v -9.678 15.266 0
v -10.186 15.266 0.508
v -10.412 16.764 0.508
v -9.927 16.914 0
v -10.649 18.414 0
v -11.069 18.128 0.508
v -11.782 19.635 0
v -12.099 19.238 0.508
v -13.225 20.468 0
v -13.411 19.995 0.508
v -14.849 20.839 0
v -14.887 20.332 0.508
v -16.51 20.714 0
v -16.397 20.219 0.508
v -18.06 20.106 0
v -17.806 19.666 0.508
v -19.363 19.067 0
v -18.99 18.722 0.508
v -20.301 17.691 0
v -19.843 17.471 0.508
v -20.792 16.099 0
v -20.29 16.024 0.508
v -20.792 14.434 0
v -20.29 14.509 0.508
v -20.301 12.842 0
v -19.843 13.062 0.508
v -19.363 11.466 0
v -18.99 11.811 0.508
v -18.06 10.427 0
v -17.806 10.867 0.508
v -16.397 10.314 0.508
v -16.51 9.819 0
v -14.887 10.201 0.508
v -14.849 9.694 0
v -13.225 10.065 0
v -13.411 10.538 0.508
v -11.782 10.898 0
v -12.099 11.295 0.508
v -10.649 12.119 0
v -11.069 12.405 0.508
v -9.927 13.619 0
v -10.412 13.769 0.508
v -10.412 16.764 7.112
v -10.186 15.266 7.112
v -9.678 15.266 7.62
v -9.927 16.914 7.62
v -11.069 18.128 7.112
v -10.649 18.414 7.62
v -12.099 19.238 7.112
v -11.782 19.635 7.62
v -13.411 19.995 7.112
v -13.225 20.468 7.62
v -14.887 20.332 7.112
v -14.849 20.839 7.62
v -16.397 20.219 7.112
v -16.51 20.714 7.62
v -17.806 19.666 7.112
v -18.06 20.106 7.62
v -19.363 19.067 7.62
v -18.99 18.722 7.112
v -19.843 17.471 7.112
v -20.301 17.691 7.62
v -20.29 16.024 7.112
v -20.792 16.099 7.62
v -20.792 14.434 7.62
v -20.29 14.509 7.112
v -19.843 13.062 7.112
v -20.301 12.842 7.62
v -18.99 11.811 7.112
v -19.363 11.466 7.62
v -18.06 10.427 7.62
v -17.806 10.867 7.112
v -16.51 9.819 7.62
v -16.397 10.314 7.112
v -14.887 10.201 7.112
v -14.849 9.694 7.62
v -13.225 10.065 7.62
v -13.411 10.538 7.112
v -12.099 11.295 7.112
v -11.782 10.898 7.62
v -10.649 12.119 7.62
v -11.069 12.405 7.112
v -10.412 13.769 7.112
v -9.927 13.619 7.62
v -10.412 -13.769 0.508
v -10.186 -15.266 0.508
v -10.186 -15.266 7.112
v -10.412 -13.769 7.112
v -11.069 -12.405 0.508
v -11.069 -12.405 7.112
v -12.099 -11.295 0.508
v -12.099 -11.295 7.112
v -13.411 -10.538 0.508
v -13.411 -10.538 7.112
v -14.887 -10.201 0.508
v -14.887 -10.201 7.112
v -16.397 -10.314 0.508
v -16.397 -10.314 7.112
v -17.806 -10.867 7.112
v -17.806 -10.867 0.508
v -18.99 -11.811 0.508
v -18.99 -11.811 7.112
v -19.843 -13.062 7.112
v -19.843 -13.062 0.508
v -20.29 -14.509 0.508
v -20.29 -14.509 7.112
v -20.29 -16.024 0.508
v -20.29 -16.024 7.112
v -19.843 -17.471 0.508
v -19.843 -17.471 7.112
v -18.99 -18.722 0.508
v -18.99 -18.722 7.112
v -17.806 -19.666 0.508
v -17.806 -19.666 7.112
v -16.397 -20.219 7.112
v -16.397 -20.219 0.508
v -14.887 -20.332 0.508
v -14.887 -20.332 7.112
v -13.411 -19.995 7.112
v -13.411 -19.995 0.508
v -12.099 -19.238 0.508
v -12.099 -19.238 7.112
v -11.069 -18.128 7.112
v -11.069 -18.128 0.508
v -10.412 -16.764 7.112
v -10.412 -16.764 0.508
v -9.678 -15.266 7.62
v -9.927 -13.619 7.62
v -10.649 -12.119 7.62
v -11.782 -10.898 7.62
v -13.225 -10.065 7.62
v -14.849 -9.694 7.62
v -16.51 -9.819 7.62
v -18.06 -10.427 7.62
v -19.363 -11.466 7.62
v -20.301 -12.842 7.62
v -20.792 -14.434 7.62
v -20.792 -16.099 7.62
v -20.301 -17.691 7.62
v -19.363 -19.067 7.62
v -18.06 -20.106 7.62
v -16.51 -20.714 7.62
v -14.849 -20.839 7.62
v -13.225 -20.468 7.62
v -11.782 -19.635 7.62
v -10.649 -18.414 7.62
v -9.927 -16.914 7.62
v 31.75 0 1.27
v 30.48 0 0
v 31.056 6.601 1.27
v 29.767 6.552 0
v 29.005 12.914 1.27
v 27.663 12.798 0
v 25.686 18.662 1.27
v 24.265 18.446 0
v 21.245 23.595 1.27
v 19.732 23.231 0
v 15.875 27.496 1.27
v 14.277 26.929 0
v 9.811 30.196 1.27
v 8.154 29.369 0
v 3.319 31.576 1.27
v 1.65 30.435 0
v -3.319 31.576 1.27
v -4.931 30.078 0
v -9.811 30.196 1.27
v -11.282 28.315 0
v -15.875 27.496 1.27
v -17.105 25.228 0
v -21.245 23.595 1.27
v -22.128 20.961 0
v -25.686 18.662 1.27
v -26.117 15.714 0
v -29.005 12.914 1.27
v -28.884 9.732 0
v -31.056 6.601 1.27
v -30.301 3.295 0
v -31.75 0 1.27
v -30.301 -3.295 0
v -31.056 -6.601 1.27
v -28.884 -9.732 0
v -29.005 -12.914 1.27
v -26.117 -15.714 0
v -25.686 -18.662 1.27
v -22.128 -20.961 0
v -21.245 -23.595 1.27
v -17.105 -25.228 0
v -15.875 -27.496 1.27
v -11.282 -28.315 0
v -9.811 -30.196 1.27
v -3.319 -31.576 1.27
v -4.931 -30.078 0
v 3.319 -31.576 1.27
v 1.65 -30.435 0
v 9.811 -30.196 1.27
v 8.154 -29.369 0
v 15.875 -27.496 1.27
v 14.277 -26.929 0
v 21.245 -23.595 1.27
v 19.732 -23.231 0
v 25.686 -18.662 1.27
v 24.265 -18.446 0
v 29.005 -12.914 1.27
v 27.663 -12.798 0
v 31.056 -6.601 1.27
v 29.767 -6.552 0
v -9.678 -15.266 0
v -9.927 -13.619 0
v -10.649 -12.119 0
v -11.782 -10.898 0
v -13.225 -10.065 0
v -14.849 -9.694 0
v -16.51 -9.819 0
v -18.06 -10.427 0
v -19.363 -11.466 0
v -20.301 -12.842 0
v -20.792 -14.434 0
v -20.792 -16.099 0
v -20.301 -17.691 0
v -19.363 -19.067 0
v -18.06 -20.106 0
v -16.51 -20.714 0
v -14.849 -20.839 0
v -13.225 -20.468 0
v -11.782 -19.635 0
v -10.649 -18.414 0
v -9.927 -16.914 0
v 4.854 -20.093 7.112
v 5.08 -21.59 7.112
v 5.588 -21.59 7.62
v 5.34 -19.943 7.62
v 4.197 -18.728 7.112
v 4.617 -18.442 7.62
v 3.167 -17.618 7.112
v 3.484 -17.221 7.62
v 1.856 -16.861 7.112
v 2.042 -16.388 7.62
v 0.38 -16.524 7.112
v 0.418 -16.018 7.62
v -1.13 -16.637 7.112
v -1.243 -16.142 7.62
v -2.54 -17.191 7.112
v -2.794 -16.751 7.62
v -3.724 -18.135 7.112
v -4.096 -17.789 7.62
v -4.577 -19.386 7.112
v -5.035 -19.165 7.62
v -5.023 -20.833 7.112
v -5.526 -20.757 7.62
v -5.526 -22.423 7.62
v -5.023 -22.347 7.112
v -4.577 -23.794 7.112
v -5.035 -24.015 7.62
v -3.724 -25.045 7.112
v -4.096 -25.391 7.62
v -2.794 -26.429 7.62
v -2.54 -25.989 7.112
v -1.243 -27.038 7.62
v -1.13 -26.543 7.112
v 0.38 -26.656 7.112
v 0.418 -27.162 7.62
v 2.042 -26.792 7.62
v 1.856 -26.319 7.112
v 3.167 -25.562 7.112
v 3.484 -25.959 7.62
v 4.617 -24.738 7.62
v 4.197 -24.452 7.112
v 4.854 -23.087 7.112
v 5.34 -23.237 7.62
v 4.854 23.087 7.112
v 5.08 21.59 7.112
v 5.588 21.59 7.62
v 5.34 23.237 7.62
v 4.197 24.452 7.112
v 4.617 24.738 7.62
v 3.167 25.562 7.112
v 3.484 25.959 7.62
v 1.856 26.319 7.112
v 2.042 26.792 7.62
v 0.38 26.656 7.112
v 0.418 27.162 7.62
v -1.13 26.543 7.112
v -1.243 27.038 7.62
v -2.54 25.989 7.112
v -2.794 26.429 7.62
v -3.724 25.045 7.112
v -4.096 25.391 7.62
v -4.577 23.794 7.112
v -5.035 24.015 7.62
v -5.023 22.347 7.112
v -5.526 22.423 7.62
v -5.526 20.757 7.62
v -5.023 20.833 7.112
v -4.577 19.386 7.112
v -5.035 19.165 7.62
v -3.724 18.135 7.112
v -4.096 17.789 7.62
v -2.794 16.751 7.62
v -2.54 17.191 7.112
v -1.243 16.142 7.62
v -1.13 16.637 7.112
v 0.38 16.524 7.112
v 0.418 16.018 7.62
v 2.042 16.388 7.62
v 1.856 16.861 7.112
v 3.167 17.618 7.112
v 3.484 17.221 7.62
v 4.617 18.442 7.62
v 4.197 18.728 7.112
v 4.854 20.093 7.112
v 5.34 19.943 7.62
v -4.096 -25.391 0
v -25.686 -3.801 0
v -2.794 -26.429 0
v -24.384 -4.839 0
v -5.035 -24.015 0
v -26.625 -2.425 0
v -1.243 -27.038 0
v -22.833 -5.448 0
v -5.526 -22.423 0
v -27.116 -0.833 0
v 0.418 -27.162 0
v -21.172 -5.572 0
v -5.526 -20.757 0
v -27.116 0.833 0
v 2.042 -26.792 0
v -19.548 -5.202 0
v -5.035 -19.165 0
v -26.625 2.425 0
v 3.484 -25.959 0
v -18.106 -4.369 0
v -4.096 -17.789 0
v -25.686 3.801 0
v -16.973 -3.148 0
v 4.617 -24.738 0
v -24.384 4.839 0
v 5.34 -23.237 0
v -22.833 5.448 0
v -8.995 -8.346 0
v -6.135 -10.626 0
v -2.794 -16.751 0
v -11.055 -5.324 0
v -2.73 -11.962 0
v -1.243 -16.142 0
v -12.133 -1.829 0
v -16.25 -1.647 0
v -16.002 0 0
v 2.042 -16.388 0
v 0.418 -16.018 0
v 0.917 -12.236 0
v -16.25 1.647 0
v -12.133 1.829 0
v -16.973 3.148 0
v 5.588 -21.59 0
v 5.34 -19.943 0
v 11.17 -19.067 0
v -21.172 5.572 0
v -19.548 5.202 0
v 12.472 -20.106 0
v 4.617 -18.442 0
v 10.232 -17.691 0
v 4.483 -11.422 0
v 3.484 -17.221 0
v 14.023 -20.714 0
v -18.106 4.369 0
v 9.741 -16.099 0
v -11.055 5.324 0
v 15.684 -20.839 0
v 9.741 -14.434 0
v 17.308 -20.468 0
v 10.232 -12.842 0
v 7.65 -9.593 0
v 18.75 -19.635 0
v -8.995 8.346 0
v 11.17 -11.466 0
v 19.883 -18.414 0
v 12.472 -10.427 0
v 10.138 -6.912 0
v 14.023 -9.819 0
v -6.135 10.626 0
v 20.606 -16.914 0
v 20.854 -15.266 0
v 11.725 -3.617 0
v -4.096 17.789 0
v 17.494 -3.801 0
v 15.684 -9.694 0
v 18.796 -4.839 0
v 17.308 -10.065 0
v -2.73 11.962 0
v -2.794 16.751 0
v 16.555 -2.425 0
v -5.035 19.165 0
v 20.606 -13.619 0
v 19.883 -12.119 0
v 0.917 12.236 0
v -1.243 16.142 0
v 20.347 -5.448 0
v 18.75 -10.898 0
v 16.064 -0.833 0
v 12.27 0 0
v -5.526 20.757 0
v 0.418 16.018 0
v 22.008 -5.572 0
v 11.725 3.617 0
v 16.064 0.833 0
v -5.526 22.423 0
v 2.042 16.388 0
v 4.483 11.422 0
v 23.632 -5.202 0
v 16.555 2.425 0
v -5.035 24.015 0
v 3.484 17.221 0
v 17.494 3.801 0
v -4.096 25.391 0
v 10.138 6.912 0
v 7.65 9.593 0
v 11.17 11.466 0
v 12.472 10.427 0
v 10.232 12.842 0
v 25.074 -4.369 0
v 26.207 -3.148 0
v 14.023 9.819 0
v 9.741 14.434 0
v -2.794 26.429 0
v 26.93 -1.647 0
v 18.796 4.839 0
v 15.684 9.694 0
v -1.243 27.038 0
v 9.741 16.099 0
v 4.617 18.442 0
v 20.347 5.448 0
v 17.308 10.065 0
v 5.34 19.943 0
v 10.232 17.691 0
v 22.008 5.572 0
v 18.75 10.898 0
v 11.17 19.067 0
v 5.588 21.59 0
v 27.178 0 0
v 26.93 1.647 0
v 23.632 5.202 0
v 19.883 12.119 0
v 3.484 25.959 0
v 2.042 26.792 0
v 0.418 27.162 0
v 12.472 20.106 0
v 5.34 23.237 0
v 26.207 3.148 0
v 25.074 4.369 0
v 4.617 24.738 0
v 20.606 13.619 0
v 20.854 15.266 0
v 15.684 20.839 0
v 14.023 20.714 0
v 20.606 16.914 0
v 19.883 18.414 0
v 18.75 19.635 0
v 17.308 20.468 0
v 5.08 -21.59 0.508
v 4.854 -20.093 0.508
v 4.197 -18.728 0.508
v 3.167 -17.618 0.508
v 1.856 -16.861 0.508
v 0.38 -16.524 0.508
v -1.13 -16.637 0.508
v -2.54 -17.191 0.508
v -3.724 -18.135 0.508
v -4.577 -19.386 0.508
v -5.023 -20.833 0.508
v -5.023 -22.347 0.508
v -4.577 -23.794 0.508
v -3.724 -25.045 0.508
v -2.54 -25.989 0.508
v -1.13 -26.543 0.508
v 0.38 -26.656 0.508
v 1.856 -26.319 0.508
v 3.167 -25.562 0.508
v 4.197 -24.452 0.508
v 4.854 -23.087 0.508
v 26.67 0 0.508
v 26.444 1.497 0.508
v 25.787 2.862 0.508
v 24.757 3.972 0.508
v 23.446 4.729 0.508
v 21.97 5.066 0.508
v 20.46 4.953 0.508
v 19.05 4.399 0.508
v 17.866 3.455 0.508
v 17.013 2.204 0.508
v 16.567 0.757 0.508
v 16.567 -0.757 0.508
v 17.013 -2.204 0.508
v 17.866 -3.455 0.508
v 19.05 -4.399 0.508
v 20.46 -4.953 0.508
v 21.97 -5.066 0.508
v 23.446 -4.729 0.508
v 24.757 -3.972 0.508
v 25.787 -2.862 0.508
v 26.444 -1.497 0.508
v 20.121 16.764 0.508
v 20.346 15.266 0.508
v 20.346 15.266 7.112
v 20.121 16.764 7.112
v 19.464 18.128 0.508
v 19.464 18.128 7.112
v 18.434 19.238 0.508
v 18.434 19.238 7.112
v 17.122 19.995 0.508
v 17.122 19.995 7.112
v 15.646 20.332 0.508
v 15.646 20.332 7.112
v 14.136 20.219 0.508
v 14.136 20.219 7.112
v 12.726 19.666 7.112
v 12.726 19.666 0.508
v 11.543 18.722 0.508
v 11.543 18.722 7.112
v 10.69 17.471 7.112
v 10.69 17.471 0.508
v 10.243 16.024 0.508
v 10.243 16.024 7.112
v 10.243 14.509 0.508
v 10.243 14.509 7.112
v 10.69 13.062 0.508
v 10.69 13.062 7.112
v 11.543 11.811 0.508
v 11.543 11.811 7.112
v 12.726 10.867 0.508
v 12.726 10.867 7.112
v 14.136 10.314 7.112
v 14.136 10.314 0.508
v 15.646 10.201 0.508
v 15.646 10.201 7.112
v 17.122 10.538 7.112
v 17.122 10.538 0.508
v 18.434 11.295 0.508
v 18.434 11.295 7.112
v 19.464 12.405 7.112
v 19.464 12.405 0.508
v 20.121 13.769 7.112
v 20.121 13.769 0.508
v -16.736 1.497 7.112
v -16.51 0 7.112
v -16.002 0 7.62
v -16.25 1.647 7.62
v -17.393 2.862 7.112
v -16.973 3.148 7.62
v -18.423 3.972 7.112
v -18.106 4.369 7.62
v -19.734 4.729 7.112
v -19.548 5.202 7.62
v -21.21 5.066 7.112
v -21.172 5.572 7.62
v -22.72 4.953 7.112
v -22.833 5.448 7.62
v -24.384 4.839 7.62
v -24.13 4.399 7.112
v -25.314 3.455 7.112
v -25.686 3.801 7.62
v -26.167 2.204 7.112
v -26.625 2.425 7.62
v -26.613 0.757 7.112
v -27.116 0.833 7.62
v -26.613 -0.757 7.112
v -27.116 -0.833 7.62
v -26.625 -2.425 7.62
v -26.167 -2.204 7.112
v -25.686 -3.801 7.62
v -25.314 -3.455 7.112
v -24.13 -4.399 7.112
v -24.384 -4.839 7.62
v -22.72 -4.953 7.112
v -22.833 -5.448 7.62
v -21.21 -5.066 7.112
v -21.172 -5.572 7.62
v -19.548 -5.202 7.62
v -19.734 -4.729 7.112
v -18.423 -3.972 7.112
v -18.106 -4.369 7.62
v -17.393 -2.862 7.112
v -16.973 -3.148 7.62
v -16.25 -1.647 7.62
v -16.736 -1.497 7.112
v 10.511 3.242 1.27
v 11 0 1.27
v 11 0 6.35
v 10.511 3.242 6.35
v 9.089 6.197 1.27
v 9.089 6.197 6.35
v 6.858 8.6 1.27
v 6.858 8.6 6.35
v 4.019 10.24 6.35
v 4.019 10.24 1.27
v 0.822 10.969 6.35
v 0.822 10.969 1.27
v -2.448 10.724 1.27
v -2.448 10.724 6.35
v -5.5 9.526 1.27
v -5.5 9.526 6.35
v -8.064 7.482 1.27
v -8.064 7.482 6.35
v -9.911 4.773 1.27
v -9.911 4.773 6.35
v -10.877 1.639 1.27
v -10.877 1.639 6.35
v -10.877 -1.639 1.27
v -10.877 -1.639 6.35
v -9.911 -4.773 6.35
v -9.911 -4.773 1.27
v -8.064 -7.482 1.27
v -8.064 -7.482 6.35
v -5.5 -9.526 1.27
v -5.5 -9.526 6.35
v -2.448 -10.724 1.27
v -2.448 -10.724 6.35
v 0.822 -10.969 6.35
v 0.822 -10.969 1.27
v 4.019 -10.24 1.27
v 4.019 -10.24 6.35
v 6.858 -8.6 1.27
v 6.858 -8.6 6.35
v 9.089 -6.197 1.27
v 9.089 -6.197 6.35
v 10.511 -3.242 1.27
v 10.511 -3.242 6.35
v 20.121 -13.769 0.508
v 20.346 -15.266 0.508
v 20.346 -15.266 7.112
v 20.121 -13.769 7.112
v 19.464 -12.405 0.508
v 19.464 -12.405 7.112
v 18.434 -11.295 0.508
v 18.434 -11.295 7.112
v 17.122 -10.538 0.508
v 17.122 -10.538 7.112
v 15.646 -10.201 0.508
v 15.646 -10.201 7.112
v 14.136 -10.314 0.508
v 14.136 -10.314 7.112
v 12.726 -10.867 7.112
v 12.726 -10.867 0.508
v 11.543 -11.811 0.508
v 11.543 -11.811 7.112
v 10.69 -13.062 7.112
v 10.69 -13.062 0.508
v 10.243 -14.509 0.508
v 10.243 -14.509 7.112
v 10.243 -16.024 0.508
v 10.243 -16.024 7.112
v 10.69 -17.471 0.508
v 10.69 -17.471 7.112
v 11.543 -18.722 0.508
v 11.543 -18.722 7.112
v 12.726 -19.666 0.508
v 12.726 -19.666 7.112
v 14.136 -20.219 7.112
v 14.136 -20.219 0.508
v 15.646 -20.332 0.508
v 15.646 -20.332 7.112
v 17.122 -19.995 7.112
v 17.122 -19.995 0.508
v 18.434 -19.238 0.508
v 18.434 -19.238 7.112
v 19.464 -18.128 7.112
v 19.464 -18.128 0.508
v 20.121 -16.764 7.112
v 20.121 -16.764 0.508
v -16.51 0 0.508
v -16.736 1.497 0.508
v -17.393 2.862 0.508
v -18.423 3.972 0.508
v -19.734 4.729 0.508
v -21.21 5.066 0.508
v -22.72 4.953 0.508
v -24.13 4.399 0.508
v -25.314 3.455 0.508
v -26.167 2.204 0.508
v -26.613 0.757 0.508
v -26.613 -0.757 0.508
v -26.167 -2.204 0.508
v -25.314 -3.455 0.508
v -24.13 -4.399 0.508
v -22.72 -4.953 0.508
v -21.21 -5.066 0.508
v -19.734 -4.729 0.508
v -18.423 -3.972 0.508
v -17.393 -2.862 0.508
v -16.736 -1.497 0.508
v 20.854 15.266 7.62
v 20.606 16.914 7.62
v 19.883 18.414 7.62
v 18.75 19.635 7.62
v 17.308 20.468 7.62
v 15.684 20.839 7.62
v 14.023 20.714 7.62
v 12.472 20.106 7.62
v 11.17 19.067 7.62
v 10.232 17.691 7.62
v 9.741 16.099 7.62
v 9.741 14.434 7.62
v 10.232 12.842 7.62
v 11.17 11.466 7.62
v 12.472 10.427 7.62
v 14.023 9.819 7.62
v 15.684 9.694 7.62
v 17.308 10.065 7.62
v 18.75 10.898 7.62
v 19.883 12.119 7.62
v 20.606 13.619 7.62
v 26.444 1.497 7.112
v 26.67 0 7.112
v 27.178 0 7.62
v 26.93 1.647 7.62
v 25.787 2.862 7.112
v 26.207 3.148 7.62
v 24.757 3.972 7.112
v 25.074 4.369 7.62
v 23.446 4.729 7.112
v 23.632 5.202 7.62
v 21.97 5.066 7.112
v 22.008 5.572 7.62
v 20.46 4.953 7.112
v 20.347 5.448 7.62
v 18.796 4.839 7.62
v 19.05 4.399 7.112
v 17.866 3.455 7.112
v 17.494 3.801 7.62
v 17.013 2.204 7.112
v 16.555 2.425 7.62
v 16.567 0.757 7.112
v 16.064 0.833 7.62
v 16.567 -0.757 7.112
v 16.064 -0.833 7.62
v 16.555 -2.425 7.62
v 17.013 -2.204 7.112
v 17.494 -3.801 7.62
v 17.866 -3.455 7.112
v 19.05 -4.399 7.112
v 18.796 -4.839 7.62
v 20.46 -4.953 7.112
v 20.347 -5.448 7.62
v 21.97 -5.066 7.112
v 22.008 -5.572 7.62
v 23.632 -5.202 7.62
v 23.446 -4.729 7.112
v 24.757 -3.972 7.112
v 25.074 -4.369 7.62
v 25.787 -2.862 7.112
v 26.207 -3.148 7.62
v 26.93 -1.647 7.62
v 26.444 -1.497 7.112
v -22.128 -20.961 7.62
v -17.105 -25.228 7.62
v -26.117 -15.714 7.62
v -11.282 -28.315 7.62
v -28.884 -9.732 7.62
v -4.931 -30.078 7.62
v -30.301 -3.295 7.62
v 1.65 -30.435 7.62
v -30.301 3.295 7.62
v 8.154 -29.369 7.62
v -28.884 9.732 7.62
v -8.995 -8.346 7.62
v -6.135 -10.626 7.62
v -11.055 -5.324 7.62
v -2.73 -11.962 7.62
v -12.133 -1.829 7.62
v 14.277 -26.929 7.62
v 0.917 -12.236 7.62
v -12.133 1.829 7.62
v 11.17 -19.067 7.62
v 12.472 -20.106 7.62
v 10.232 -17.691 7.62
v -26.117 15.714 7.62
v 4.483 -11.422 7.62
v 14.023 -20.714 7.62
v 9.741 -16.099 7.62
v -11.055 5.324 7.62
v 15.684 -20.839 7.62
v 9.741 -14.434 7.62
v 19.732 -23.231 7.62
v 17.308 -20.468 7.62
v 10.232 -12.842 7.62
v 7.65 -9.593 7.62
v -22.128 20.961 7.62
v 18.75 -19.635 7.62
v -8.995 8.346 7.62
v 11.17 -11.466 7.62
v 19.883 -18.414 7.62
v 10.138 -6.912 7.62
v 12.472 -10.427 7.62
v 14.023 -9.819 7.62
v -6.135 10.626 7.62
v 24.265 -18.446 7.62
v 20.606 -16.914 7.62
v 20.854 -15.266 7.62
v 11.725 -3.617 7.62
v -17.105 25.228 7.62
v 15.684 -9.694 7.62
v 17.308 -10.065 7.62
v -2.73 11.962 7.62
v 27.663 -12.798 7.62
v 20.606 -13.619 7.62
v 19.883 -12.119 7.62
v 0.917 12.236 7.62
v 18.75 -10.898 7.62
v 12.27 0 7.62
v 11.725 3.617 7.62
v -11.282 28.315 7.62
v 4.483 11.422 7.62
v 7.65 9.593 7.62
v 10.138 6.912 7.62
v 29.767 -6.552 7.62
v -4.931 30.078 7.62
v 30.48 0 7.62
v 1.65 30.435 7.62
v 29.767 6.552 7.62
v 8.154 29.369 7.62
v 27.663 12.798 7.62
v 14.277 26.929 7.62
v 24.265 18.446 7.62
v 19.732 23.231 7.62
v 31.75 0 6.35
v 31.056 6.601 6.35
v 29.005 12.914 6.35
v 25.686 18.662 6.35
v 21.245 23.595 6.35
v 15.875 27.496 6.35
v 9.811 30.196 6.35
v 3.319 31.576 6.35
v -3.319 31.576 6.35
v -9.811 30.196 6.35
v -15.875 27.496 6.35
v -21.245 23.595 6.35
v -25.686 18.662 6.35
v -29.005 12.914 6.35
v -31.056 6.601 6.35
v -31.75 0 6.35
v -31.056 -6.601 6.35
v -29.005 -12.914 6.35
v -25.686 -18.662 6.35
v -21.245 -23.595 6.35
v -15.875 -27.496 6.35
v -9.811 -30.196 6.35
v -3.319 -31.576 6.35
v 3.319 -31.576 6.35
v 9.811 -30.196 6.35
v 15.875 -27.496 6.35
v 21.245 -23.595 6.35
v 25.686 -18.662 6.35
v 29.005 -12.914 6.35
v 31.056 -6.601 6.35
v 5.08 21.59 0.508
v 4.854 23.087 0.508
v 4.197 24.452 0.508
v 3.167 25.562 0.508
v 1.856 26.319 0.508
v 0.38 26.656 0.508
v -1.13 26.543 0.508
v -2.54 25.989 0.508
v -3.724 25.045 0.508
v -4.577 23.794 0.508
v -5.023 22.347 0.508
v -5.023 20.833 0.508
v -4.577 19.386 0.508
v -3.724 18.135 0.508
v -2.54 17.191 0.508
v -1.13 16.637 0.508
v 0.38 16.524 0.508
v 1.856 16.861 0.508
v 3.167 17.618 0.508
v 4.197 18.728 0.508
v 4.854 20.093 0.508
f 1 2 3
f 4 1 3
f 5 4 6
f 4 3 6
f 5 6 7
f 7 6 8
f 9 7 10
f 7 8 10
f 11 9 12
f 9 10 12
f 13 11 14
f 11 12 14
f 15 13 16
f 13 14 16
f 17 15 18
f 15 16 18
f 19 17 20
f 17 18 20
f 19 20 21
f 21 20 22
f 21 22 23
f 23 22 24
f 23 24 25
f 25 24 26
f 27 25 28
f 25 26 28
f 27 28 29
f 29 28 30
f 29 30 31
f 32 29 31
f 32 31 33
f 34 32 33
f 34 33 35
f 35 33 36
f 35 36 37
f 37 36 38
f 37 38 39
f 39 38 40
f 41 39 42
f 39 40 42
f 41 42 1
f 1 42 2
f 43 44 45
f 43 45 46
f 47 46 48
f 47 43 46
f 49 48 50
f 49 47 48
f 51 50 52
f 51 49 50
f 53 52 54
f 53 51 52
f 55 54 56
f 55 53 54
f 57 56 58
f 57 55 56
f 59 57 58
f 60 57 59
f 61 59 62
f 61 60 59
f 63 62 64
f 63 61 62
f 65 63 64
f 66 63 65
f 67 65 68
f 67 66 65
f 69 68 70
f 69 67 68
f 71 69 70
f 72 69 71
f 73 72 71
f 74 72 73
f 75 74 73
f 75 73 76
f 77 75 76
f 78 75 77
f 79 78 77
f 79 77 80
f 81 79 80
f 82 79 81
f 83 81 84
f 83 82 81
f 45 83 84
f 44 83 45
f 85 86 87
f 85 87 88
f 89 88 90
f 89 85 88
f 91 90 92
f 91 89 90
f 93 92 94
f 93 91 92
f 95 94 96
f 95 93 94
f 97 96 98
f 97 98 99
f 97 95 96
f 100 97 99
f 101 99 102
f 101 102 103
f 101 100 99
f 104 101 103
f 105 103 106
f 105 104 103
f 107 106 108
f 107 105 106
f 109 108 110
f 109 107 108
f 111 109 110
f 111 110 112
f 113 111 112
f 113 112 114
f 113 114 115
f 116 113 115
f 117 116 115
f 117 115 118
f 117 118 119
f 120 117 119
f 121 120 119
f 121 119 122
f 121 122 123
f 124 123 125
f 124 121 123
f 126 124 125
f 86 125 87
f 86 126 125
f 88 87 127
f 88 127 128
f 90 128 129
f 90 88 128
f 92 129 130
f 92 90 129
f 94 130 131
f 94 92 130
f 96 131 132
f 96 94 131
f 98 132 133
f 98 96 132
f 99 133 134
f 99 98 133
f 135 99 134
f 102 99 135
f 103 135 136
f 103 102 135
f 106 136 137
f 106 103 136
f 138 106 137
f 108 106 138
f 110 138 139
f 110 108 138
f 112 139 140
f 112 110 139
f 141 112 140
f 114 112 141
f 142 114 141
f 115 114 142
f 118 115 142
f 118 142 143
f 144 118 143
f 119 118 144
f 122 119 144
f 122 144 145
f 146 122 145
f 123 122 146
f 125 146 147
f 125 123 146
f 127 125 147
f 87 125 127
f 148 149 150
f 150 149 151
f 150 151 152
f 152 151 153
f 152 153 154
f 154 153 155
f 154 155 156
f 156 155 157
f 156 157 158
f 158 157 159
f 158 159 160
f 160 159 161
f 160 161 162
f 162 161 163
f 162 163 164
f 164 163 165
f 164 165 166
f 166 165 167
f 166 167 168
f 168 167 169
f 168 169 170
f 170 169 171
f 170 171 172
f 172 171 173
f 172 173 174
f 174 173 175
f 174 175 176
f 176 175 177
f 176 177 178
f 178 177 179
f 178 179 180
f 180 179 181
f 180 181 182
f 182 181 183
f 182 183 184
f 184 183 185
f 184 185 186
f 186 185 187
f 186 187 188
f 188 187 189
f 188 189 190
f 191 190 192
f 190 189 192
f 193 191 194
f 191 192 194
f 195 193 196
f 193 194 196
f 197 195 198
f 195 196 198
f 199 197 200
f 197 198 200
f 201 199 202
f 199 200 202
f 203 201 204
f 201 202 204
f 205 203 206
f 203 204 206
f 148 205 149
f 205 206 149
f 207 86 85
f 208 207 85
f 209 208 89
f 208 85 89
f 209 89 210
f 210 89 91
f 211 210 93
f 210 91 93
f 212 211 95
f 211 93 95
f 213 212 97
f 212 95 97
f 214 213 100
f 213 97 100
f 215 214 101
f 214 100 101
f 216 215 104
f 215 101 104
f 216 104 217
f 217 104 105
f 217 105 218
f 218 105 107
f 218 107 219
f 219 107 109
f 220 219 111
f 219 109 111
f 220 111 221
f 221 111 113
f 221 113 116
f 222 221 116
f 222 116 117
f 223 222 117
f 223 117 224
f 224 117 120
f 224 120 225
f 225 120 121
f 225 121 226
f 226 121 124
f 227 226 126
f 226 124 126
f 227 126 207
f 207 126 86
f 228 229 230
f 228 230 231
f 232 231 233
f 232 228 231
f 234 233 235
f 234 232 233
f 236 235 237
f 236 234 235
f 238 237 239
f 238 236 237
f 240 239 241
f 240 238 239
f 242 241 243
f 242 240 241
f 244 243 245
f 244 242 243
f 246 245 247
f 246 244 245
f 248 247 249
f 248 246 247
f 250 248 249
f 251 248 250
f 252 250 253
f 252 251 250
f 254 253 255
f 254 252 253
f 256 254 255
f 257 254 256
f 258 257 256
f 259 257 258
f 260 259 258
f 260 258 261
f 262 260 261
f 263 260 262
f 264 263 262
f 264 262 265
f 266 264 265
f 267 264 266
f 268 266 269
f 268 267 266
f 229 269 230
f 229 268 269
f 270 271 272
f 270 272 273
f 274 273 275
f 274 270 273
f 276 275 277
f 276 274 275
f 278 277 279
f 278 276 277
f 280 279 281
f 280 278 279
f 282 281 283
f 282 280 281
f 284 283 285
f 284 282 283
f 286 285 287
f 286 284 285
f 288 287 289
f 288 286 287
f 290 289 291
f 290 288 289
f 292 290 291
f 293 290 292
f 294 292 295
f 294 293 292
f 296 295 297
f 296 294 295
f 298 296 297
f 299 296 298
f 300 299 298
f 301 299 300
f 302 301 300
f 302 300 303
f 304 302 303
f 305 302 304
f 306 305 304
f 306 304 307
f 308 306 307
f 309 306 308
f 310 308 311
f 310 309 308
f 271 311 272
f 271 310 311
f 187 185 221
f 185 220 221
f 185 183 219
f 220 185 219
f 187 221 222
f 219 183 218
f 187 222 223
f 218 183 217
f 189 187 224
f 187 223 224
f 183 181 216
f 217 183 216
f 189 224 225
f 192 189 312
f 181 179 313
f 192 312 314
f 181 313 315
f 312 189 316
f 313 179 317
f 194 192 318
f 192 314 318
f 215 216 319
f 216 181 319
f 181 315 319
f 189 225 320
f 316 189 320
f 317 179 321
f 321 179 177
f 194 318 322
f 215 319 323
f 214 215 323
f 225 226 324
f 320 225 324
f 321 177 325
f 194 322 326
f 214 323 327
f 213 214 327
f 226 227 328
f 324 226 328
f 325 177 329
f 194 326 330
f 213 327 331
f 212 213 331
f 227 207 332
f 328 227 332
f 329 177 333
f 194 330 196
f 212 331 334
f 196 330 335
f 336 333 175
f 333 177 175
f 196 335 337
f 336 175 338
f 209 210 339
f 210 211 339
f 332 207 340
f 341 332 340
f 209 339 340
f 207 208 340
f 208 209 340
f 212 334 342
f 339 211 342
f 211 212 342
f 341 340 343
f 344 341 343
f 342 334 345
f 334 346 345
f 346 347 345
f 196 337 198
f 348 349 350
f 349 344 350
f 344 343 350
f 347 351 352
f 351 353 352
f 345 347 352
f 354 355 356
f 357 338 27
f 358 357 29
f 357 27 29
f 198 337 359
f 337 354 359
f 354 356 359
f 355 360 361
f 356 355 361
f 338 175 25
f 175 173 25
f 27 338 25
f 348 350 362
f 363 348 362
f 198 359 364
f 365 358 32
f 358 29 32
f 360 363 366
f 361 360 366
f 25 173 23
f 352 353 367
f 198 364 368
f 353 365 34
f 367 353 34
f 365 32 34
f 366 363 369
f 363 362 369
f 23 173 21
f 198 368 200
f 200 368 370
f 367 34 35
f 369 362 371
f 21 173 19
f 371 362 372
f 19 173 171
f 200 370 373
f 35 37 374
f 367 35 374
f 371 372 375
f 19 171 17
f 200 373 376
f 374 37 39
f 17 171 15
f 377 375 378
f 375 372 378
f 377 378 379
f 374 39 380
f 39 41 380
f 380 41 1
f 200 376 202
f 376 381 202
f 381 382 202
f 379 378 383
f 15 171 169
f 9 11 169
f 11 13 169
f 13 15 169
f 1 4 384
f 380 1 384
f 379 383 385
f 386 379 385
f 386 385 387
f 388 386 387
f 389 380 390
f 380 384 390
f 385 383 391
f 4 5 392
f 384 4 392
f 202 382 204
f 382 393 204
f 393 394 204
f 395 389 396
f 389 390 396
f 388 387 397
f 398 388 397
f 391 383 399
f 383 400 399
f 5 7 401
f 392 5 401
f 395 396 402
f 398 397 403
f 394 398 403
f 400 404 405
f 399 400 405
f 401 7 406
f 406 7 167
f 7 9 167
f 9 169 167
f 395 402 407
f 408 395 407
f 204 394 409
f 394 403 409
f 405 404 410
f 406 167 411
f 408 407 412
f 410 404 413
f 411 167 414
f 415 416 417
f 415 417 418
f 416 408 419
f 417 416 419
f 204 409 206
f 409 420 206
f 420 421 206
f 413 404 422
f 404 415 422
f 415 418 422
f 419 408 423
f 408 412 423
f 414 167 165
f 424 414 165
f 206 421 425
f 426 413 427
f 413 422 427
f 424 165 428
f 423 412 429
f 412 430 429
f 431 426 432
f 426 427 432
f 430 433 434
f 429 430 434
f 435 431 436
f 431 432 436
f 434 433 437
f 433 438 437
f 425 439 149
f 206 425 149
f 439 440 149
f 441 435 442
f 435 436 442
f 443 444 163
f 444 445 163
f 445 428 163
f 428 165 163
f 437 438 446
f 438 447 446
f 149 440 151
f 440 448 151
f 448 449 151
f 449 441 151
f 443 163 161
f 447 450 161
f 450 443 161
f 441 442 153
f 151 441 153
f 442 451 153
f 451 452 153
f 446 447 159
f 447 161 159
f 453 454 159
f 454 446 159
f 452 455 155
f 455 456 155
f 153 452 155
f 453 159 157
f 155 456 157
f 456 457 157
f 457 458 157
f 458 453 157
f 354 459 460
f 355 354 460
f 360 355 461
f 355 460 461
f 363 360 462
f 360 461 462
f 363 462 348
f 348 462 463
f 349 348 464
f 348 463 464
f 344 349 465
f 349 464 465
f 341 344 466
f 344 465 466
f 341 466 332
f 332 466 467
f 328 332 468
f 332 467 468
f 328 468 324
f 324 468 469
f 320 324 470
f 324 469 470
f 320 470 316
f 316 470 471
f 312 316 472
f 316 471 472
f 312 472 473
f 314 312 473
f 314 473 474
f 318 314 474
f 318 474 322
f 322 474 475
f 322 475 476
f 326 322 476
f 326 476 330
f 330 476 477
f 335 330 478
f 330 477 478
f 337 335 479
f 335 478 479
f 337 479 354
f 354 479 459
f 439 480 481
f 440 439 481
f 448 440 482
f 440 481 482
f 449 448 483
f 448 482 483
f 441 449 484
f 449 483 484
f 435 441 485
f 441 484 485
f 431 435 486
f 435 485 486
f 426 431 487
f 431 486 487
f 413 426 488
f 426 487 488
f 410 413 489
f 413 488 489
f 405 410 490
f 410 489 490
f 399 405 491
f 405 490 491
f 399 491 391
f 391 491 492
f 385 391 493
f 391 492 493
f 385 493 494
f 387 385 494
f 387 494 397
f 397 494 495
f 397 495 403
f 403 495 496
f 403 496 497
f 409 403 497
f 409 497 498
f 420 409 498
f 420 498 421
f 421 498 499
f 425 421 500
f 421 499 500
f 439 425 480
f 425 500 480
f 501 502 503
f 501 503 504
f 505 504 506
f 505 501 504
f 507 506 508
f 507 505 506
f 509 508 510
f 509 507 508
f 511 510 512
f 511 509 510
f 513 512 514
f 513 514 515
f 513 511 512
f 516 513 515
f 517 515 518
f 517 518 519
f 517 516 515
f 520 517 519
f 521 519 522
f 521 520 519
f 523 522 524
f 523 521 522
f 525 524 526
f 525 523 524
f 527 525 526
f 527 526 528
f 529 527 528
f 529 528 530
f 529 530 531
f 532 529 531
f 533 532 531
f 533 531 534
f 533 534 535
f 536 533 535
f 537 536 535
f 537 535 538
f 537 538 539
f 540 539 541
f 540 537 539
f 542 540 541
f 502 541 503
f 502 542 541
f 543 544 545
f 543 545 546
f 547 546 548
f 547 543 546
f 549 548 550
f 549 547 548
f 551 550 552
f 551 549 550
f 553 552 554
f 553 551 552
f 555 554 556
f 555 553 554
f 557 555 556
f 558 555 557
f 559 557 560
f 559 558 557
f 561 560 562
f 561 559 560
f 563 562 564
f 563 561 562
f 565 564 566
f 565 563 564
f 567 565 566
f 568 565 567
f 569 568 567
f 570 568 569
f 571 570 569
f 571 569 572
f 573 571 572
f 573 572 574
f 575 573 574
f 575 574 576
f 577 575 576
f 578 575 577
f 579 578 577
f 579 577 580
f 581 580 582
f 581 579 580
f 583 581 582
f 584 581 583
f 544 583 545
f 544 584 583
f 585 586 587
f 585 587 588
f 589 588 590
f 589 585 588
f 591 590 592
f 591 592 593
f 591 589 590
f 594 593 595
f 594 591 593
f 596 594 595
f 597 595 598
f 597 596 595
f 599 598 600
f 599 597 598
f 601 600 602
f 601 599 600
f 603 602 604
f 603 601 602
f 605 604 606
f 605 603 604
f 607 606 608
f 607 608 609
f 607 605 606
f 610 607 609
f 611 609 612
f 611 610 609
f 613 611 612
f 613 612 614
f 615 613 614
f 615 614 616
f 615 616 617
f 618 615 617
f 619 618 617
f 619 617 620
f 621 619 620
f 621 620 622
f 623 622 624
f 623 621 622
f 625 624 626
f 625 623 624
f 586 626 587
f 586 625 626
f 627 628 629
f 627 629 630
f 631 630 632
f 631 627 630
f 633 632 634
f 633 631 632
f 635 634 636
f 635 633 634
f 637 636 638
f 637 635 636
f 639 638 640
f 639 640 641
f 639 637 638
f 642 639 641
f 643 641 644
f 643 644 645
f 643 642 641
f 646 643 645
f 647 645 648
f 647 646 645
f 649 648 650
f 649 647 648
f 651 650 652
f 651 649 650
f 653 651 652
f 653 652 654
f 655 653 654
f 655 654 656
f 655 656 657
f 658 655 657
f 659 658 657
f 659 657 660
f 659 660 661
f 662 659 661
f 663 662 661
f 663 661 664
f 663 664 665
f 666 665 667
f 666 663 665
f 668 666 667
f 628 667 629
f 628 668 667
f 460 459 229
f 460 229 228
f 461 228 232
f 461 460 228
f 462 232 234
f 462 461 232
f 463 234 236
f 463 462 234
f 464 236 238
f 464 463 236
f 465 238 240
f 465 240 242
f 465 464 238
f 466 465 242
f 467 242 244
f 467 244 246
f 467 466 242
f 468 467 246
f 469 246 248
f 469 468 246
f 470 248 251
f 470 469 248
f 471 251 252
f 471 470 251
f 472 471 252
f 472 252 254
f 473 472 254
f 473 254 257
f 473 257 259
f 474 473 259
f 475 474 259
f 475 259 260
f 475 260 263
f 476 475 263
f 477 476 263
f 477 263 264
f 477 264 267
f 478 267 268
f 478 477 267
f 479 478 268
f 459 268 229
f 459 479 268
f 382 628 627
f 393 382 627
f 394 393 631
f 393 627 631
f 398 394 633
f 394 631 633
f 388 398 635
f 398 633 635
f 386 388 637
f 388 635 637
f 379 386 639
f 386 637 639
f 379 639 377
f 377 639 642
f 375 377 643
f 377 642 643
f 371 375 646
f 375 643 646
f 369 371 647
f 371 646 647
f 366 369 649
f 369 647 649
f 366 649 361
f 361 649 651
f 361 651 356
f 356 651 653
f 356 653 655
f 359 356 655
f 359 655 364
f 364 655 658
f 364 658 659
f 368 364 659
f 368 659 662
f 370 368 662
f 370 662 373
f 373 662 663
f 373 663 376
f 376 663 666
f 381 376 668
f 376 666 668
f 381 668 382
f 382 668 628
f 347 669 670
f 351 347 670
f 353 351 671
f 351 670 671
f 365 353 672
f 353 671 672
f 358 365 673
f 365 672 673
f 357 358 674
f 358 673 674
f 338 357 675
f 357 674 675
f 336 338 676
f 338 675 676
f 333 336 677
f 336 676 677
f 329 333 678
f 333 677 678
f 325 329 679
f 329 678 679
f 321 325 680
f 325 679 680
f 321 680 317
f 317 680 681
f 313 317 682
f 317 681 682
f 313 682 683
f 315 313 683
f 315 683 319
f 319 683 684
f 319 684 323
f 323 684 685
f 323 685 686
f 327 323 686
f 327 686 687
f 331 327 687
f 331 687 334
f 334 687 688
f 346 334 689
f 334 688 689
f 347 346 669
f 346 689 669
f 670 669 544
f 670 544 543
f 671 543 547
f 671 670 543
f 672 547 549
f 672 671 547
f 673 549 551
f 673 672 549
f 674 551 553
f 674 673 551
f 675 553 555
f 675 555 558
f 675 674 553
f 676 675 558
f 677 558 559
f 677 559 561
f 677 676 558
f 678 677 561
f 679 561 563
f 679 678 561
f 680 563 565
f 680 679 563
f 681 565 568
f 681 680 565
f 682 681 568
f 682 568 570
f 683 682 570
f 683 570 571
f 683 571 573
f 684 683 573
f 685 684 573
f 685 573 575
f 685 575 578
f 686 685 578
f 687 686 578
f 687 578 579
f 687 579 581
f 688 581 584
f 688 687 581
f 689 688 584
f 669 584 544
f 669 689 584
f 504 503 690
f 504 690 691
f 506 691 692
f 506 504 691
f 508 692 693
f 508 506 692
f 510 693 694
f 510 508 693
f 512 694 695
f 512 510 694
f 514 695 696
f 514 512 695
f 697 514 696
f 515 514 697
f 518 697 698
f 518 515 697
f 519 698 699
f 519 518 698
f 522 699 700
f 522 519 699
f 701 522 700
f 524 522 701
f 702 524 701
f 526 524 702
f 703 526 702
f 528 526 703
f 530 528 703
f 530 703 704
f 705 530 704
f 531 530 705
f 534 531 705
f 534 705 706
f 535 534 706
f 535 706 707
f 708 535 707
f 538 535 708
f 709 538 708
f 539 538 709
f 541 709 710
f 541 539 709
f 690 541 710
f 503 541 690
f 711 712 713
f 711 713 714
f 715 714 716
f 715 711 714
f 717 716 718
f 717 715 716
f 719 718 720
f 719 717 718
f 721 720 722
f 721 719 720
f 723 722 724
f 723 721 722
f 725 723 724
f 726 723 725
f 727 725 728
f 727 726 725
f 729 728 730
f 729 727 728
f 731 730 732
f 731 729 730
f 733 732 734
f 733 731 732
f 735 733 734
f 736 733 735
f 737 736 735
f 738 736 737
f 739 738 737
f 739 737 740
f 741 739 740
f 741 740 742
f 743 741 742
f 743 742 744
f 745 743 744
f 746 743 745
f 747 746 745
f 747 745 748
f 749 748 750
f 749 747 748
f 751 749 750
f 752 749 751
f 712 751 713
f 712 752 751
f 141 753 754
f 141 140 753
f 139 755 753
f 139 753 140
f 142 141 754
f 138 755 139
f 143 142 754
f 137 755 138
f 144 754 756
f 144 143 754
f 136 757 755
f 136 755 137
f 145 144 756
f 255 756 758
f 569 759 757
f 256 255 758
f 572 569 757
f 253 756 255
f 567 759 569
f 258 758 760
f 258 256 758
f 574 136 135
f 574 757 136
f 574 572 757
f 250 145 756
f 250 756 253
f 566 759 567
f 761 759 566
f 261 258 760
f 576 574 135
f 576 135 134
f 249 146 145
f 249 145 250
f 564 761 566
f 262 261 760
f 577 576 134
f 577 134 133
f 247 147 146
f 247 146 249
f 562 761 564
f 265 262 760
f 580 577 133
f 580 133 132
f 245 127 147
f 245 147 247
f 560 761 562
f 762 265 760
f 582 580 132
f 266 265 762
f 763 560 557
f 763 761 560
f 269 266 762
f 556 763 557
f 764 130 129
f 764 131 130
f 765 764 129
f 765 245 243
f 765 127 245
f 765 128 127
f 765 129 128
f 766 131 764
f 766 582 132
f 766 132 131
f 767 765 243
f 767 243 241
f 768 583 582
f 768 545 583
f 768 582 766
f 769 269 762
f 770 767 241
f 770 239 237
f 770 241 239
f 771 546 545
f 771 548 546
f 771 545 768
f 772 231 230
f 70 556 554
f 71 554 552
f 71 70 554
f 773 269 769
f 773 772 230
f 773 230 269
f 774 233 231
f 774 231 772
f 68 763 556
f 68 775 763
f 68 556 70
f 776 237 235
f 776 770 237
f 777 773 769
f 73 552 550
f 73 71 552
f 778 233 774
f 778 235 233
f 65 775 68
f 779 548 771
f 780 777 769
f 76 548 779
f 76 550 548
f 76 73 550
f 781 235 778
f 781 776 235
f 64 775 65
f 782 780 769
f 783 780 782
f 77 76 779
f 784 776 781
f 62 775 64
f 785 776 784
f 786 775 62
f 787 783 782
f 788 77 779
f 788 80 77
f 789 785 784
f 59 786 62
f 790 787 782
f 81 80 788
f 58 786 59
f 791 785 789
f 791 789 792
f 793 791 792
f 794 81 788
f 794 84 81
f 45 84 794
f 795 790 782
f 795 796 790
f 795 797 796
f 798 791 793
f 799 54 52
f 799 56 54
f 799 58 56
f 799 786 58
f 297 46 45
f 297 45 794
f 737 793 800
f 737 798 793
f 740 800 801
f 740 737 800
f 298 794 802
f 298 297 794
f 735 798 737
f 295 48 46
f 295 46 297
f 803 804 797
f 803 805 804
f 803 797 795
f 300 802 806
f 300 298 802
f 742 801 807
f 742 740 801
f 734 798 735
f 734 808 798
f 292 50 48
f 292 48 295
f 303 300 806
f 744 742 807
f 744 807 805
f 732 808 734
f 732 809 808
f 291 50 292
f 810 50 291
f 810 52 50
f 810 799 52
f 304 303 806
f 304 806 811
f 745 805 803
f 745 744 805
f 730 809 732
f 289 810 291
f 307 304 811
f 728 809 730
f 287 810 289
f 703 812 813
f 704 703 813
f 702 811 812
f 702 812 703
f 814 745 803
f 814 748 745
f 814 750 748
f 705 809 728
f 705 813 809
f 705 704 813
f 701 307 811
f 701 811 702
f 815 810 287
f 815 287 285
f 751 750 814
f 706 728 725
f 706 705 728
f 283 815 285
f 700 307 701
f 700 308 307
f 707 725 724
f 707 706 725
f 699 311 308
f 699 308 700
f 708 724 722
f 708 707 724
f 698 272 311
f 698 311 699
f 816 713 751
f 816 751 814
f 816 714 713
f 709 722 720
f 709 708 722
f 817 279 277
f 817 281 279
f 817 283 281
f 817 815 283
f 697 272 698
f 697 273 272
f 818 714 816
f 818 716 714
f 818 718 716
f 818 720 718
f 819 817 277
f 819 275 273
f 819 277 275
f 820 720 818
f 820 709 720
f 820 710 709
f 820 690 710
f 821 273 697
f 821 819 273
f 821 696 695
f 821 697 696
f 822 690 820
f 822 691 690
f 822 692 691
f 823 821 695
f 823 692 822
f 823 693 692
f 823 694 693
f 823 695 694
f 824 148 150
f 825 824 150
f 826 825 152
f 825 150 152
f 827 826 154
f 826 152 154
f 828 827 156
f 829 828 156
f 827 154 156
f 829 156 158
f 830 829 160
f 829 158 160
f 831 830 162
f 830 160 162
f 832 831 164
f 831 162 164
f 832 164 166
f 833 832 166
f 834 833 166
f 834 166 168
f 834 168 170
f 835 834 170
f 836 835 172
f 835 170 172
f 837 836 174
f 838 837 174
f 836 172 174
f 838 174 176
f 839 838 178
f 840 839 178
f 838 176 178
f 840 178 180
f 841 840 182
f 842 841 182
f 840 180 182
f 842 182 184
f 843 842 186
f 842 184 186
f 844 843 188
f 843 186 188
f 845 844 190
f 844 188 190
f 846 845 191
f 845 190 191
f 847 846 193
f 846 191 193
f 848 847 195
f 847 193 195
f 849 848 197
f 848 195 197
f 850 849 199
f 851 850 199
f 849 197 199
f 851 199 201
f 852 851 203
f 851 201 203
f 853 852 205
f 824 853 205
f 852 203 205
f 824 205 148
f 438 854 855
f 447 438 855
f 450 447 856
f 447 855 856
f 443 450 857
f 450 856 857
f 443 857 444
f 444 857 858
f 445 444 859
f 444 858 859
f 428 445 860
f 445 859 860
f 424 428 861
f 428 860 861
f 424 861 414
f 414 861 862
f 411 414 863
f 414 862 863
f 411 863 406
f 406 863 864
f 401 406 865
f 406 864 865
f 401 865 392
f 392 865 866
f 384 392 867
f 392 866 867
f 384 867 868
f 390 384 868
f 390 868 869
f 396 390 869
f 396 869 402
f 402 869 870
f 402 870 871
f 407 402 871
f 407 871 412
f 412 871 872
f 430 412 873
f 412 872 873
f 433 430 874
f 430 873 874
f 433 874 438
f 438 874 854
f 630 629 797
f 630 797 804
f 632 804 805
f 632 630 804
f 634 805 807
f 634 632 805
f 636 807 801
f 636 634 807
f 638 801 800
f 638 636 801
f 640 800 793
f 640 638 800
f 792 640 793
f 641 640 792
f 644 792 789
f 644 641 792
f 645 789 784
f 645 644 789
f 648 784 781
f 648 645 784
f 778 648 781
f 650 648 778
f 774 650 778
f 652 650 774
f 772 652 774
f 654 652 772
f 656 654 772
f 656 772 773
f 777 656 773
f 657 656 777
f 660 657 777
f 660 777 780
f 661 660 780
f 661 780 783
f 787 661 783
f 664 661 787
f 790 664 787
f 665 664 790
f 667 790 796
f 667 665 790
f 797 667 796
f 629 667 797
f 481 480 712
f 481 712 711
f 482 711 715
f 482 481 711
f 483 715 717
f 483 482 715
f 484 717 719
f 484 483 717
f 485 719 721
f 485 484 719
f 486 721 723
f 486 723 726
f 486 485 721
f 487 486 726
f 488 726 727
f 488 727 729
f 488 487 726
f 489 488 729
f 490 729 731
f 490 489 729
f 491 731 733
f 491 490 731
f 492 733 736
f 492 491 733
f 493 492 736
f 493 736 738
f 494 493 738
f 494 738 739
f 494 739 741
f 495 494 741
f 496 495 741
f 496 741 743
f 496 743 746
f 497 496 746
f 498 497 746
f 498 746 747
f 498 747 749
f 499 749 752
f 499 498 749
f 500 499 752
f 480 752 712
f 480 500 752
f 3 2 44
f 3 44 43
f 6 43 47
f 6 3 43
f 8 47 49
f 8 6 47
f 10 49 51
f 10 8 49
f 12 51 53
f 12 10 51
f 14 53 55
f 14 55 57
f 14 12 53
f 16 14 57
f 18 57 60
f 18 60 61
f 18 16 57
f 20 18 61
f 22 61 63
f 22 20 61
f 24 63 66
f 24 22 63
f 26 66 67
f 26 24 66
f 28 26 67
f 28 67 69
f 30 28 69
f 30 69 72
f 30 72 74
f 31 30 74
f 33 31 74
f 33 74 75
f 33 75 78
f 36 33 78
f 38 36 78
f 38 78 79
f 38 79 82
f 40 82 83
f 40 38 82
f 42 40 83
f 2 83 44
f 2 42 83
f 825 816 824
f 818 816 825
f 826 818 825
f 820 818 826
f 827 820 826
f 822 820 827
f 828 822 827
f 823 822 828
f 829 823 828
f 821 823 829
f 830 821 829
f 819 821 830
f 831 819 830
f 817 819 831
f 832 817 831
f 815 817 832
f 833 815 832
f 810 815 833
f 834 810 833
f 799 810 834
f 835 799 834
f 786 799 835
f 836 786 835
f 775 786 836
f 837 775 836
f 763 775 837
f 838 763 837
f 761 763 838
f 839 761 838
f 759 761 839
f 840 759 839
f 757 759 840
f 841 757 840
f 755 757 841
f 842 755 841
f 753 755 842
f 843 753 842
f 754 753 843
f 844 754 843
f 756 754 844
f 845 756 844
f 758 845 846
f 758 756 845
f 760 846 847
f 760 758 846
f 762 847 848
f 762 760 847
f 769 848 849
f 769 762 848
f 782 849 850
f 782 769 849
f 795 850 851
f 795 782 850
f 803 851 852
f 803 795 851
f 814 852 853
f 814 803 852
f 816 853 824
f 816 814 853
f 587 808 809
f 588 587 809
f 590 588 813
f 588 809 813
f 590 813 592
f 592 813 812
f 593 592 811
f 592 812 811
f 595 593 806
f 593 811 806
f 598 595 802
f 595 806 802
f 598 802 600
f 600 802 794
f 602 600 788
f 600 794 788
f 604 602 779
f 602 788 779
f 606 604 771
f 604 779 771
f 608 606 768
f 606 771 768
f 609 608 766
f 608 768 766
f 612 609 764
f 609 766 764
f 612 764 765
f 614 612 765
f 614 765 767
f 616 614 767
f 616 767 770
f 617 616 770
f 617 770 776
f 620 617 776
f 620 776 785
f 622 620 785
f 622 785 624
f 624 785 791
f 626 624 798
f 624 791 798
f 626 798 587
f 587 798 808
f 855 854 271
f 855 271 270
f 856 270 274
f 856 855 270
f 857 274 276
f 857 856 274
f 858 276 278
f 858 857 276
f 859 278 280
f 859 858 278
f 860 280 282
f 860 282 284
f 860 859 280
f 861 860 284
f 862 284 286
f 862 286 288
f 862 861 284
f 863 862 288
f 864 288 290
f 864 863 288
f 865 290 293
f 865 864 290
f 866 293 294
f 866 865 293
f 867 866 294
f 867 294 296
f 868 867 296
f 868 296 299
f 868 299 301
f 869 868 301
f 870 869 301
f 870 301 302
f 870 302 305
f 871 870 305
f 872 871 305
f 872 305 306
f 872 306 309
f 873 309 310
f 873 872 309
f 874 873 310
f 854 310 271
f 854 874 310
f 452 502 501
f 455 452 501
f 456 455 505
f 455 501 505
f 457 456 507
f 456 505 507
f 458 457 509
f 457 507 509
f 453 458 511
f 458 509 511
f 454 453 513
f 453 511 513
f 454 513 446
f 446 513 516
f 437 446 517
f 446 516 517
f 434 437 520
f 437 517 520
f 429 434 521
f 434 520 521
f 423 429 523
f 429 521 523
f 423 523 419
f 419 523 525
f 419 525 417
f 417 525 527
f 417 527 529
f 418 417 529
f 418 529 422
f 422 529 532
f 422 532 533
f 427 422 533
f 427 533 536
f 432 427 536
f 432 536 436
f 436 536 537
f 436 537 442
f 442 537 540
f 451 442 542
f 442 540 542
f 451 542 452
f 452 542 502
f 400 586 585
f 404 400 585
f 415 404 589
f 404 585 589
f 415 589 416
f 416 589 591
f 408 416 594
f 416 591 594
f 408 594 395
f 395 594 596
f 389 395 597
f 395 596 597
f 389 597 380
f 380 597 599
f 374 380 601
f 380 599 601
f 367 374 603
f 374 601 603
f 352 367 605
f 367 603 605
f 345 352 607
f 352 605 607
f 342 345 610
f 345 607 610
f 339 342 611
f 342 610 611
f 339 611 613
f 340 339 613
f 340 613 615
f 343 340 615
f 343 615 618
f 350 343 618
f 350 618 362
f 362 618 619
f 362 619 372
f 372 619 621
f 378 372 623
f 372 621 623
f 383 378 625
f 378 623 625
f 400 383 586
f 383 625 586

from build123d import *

# Parameters (mm, degrees)
F0_R     = 31.75
F0_R_2   = 5.08
F0_R_3   = 11.000003
F1_DEPTH = 7.62
F2_SIZE  = 1.27
F3_SIZE  = 1.27
F4_SIZE  = 0.508


with BuildPart() as f1:
    # F0 (on Top) → F1 (new body)
    with BuildSketch(Plane.XY):
        Circle(F0_R)
        with Locations((-15.266435, -15.266435)):
            Circle(F0_R_2, mode=Mode.SUBTRACT)
        with Locations((0, -21.59)):
            Circle(F0_R_2, mode=Mode.SUBTRACT)
        with Locations((15.266435, -15.266435)):
            Circle(F0_R_2, mode=Mode.SUBTRACT)
        with Locations((-21.59, 0)):
            Circle(F0_R_2, mode=Mode.SUBTRACT)
        with Locations((-15.266435, 15.266435)):
            Circle(F0_R_2, mode=Mode.SUBTRACT)
        Circle(F0_R_3, mode=Mode.SUBTRACT)
        with Locations((15.266435, 15.266435)):
            Circle(F0_R_2, mode=Mode.SUBTRACT)
        with Locations((21.59, 0)):
            Circle(F0_R_2, mode=Mode.SUBTRACT)
        with Locations((0, 21.59)):
            Circle(F0_R_2, mode=Mode.SUBTRACT)
    extrude(amount=F1_DEPTH)

    # F2
    f2_edges = [f1.edges().sort_by_distance(p)[0] for p in [
        (-31.75, 0, 7.62),
        (-11.000003, 0, 7.62),
    ]]
    chamfer(f2_edges, length=F2_SIZE)

    # F3
    f3_edges = [f1.edges().sort_by_distance(p)[0] for p in [
        (-31.75, 0, 0),
        (-11.000003, 0, 0),
    ]]
    chamfer(f3_edges, length=F3_SIZE)

    # F4
    f4_edges = [f1.edges().sort_by_distance(p)[0] for p in [
        (-5.08, -21.59, 0),
        (20.346435, -15.266435, 3.81),
        (10.186435, -15.266435, 0),
        (10.186435, -15.266435, 7.62),
        (5.08, -21.59, 3.81),
        (-5.08, -21.59, 7.62),
        (-10.186435, -15.266435, 3.81),
        (-20.346435, -15.266435, 0),
        (-20.346435, -15.266435, 7.62),
        (-16.51, 0, 3.81),
        (-26.67, 0, 0),
        (-26.67, 0, 7.62),
        (-10.186435, 15.266435, 3.81),
        (-20.346435, 15.266435, 0),
        (-20.346435, 15.266435, 7.62),
        (5.08, 21.59, 3.81),
        (-5.08, 21.59, 0),
        (-5.08, 21.59, 7.62),
        (20.346435, 15.266435, 3.81),
        (10.186435, 15.266435, 0),
        (10.186435, 15.266435, 7.62),
        (16.51, 0, 0),
        (26.67, 0, 3.81),
        (16.51, 0, 7.62),
    ]]
    chamfer(f4_edges, length=F4_SIZE)


solid = f1.part
